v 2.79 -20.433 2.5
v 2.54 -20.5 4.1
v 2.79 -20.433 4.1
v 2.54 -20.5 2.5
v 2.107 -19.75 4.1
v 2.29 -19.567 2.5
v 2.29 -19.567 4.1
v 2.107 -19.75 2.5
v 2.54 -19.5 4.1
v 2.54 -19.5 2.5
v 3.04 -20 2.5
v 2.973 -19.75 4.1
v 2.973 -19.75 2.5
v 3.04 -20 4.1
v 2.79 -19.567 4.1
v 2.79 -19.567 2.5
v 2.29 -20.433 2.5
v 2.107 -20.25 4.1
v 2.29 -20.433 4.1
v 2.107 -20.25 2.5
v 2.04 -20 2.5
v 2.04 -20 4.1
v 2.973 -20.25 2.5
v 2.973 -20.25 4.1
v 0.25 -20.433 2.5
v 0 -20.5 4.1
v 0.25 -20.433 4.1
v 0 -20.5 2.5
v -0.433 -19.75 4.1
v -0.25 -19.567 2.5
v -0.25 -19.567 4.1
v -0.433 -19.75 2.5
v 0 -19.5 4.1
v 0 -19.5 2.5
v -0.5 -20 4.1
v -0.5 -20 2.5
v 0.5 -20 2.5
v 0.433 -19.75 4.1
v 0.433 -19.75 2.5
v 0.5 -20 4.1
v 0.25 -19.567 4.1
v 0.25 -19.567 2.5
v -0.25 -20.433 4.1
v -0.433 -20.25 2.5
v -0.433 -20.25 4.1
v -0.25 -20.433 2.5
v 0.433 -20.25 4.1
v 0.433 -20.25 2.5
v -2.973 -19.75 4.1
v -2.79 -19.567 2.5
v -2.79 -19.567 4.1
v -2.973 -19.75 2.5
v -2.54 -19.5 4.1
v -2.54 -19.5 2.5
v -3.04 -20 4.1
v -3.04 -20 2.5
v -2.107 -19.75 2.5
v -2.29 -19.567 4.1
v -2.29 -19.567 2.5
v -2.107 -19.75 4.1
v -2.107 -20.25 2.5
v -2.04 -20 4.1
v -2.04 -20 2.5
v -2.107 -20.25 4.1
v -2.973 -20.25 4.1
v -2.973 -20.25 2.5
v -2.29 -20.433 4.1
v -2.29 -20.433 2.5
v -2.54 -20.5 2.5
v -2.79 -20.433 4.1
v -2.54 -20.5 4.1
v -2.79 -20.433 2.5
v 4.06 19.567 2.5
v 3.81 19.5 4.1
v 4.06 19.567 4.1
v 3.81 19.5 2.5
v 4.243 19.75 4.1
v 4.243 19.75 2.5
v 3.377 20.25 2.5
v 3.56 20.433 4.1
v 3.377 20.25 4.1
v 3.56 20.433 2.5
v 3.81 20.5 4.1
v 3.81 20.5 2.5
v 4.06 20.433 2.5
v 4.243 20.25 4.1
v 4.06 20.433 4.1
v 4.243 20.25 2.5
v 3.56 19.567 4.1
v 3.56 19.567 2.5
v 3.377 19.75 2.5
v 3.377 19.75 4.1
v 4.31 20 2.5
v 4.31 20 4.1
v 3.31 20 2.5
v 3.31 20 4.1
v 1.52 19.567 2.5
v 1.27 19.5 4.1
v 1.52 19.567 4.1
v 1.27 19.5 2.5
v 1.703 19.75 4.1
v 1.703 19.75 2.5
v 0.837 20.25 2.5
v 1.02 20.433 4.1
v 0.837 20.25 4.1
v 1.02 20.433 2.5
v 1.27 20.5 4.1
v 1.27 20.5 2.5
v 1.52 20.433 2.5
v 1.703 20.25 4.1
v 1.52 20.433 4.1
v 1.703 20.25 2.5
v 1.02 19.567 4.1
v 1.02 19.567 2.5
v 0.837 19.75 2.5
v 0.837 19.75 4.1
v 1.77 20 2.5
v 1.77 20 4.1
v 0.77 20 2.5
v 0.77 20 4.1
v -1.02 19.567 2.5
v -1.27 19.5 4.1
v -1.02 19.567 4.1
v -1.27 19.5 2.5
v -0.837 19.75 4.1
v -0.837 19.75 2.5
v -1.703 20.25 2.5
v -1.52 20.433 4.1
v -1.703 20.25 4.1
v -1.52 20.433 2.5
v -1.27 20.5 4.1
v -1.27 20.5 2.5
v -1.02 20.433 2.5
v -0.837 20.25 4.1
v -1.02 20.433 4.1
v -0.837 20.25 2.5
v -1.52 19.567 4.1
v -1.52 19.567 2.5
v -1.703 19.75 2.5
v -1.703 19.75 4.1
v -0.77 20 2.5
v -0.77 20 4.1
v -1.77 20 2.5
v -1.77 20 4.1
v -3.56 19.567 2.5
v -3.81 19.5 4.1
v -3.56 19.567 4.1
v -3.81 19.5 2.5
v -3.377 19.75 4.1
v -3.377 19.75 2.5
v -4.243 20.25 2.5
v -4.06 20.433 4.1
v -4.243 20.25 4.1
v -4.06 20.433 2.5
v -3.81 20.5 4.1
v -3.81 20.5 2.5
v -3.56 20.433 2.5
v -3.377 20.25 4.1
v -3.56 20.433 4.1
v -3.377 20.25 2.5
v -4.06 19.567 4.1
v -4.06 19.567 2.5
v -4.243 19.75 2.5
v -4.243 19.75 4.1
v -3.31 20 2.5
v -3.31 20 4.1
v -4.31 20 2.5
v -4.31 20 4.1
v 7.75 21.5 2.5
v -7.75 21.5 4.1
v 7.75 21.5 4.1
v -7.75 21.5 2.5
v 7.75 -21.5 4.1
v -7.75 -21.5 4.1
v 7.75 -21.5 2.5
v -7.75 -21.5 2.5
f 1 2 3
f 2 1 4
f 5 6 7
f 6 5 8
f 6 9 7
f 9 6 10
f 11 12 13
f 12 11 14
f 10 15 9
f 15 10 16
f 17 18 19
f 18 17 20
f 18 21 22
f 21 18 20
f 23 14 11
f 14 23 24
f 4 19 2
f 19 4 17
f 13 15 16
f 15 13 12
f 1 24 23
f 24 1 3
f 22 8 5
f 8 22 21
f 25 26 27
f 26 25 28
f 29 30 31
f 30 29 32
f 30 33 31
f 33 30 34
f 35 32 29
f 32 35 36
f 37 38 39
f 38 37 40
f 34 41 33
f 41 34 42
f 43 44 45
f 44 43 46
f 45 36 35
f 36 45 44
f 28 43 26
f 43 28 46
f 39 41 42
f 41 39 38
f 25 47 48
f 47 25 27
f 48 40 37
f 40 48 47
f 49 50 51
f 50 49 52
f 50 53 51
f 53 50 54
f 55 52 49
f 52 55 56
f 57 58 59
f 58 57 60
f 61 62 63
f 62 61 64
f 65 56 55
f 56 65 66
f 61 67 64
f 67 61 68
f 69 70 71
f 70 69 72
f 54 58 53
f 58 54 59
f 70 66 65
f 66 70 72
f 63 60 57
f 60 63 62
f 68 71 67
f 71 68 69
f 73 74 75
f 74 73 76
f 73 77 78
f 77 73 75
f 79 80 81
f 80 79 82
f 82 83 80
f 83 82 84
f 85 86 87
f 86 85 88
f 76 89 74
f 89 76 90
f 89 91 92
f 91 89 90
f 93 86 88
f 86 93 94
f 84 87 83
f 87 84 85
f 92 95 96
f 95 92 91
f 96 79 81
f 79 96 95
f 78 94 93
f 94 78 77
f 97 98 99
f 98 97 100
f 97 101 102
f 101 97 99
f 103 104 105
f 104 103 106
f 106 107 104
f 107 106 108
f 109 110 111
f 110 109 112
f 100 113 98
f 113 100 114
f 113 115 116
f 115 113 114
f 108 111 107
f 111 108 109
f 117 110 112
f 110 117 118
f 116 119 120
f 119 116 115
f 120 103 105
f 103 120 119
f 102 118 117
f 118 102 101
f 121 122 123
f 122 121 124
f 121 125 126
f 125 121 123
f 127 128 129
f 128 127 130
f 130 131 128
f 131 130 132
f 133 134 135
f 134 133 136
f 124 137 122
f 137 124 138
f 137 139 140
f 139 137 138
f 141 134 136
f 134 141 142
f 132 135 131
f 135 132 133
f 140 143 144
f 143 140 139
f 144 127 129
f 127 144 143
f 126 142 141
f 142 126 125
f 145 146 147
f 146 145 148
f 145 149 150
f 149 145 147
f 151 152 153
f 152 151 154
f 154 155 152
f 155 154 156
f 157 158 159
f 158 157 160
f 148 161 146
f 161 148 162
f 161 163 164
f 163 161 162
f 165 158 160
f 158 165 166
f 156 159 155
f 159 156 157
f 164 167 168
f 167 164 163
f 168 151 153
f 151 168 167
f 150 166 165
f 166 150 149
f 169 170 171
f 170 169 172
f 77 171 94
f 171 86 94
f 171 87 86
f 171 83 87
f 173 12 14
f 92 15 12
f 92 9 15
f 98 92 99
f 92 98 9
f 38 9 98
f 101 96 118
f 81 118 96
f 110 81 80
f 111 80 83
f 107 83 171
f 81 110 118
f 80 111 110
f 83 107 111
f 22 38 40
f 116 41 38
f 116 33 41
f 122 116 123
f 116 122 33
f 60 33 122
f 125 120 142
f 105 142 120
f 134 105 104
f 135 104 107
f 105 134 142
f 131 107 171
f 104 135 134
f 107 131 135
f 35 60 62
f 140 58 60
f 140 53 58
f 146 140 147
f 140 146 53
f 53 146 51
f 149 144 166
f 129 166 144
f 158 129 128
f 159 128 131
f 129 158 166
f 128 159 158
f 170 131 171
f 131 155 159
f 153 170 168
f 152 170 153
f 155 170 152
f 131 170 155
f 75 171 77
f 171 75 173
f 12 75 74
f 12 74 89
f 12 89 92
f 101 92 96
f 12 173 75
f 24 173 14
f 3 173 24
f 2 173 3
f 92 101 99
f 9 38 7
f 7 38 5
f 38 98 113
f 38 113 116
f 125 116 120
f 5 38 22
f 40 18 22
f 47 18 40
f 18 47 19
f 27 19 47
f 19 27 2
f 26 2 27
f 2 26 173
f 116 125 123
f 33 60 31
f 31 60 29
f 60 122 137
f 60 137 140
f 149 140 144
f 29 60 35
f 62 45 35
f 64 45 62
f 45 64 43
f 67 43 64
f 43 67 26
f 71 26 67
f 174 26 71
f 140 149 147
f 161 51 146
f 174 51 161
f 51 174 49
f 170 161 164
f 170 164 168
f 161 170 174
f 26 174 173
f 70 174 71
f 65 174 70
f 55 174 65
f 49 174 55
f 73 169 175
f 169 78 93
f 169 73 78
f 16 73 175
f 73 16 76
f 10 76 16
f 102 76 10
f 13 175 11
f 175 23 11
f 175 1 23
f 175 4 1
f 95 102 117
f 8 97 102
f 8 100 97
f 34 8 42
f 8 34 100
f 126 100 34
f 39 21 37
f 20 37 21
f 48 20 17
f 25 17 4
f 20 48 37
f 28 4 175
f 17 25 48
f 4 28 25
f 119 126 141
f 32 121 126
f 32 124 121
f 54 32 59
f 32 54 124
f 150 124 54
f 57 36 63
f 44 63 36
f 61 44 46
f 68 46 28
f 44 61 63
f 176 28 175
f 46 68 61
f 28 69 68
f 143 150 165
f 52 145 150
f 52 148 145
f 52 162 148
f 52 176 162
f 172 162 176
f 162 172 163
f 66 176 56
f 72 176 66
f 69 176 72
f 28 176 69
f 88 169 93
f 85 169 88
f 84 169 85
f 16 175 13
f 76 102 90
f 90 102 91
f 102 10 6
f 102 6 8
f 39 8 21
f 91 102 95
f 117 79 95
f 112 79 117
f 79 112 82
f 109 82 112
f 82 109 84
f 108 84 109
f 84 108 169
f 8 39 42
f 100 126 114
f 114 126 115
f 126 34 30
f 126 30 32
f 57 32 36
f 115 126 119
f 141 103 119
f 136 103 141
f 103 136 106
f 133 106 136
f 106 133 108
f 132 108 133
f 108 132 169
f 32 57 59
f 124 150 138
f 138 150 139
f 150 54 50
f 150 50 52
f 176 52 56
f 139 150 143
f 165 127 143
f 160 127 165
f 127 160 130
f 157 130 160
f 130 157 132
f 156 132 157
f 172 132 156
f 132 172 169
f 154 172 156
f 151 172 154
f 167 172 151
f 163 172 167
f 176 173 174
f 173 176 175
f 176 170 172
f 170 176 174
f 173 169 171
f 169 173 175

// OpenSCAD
// file: ../../board-pocket/board-pocket.scad
//-----------------------------------------------------------------------
// Board pocket: holds a board that has no mounting holes
//
// The board sits on a central pedestal with a pad of double-sided foam tape
// on top, inside a low wall that follows its outline. The pedestal keeps
// the board's edges off the floor, so lead stubs soldered through the edge
// holes have room underneath; gaps in the wall let the leads out. The wall
// only locates the board: the tape holds it down, and in a closed box a lid
// pad presses a pad of foam onto it (boardLidPad below).
//
// Modules, all in the same frame:
//   boardPocketGhost()   the board and its tape, for previews
//   boardPocketHolder()  the plastic: pedestal and outline wall, add to the floor
//   boardLidPad()        a block hanging from the lid that presses foam onto the board
//   boardLidPadGhost()   the foam under it, squashed, for previews
//
// Frame: origin on the floor top, under the centre of the board's outline.
// X along the board's length l, Y across its width w, Z up. Units: mm.
//
// Sides are listed [-X, +X, -Y, +Y], each one of
//   "gap"    wall with a gap in the middle for leads (gapW wide)
//   "solid"  whole wall: use it where the board takes a push (a plug)
//   "open"   no wall: the board's edge goes into a box wall (a USB port)
//
// Used by esp32-c3-supermini, esp32-s3-devkitc and rs485-max485.
//-----------------------------------------------------------------------

//-- From the controller project's receiver.scad / rack-end.scad (boardPocket), 2026-10-30
bpPedestal  = 2.5;     // floor to the tape: room for lead stubs under the board edges
bpTape      = 1.0;     // double-sided foam tape on the pedestal. CAL: how far it squashes
bpWall      = 1.2;     // outline wall thickness
bpRise      = 1.0;     // wall top above the PCB underside (the controller project's rack-end: 0.8 under the S3's module)
bpClearance = 0.4;     // per side, board outline to wall: PETG. 0.3 for PLA. Set by the fit piece
bpGapW      = 6;       // lead gap in a "gap" side
bpPadInset  = 4;       // default pedestal: the board less this all round

//-- Lid hold-down (the controller project's receiver / rack-end lid pads)
bpFoam      = 3.0;     // CAL: self-adhesive foam stuck under each lid pad
bpSqueeze   = 1.0;     // how far the lid squashes it: ~1/3 for soft foam, 0.3 for felt

//-- PCB underside above the floor top
function boardPocketZ(pedestal = bpPedestal, tape = bpTape) = pedestal + tape;
//-- default pedestal [l, w] for a board
function boardPocketPad(l, w, inset = bpPadInset) = [max(l - 2*inset, 4), max(w - 2*inset, 4)];
//-- Z of a lid pad's underside, pressing on a surface at surfaceZ (board top, or a part on it)
function boardLidPadZ(surfaceZ, foam = bpFoam, squeeze = bpSqueeze) =
  assert(squeeze > 0 && squeeze < foam, "foam would not touch the board")
  surfaceZ + foam - squeeze;

function bpSides4(s) = is_list(s) ? s : [s, s, s, s];

module boardPocketGhost(l, w, pcb = 1.6, pad, pedestal = bpPedestal, tape = bpTape)
{
  p = is_undef(pad) ? boardPocketPad(l, w) : pad;
  %color("White") translate([-p[0]/2, -p[1]/2, pedestal]) cube([p[0], p[1], tape]);
  %color("DarkGreen") translate([-l/2, -w/2, pedestal + tape]) cube([l, w, pcb]);
}

//-- pad: pedestal [l, w]; gapW a number or one per side
module boardPocketHolder(l, w, pad, sides = "gap", gapW = bpGapW, clearance = bpClearance,
                         pedestal = bpPedestal, tape = bpTape, wall = bpWall, rise = bpRise)
{
  p   = is_undef(pad) ? boardPocketPad(l, w) : pad;
  s   = bpSides4(sides);
  g   = bpSides4(gapW);
  ix  = l/2 + clearance;                 // inner half sizes
  iy  = w/2 + clearance;
  top = pedestal + tape + rise;
  assert(p[0] <= l && p[1] <= w, "pedestal bigger than the board");
  for (k = s) assert(k == "gap" || k == "solid" || k == "open", str("unknown side ", k));

  //-- pedestal, centred under the board
  translate([-p[0]/2, -p[1]/2, -0.01]) cube([p[0], p[1], pedestal + 0.01]);
  //-- outline wall
  difference()
  {
    translate([-ix - wall, -iy - wall, -0.01]) cube([2*(ix + wall), 2*(iy + wall), top + 0.01]);
    translate([-ix, -iy, -1]) cube([2*ix, 2*iy, top + 2]);
    for (i = [0 : 3])
    {
      //-- each side's cut, drawn for -X then turned into place
      ax = (i < 2) ? ix : iy;         // inner half size across the side
      al = (i < 2) ? iy : ix;         // half length along it
      rotate([0, 0, [0, 180, 90, 270][i]])   // -X, +X, -Y, +Y
      {
        if (s[i] == "gap")
          translate([-ax - wall - 1, -g[i]/2, -1]) cube([wall + 2, g[i], top + 2]);
        if (s[i] == "open")
          translate([-ax - wall - 1, -al - wall - 1, -1]) cube([wall + 1.01, 2*(al + wall + 1), top + 2]);
      }
    }
  }
}

//-- A lid pad over the rectangle size [x, y] centred at `at`, from the squashed foam up to
//-- lidZ (the lid's inner face in this frame), running `into` up into the lid plate
module boardLidPad(size, at = [0, 0], surfaceZ, lidZ, foam = bpFoam, squeeze = bpSqueeze, into = 0.5)
{
  z0 = boardLidPadZ(surfaceZ, foam, squeeze);
  assert(lidZ > z0, "lid is below the pad: the box is too low for the foam");
  translate([at[0] - size[0]/2, at[1] - size[1]/2, z0]) cube([size[0], size[1], lidZ - z0 + into]);
}

module boardLidPadGhost(size, at = [0, 0], surfaceZ, foam = bpFoam, squeeze = bpSqueeze)
{
  %color("Gray") translate([at[0] - size[0]/2, at[1] - size[1]/2, surfaceZ]) cube([size[0], size[1], foam - squeeze]);
}
// file: ../../rs485-max485/rs485-max485.scad
//-----------------------------------------------------------------------
// TTL-to-RS485 module (MAX485 and friends), on the floor
//
// These modules have no mounting holes. The board sits on a taped pedestal
// inside an outline pocket (board-pocket), with lead gaps at both ends (bus
// end and logic end) and in the long sides. In a closed box two lid pads
// press foam onto it, one inboard of each end's pin row.
//
// Modules, all in the same frame:
//   rs485Ghost()     the board, its chips, pin holes and any screw terminal
//   rs485Holder()    the plastic: pedestal and outline pocket, add to the floor
//   rs485LidPads()   blocks under the lid that press foam onto the board
//
// Frame: origin on the floor top under the centre of the board. X along the
// board, bus end (A/B) at -X, logic end (VCC/TXD/RXD/GND) at +X. Z up. Units: mm.
//
// Sizes: pick a row of rs485Variants by name.
//-----------------------------------------------------------------------

//-- included, not used, so its default values (bpTape, bpClearance...) are in scope here
include <../board-pocket/board-pocket.scad>

//-- [name, length, width, pcb, tallest SMD, bus pins, logic pins, screw terminal [l, w, h] or undef]
rs485Variants = [
  //-- JZK 5-pack B09VGJCJKQ, auto-direction (MAX485 + CD4069). Outline measured 2026-10-21;
  //-- PCB CAL (probably 1.6). Bus end: A+ B- earth, bare holes. Logic: VCC TXD RXD GND
  ["jzk",    43.0, 15.5,  1.6, 2.0, 3, 4, undef],
  //-- XY-017 auto-direction (WINGONEER manual, manuals.plus/asin/B06XHH6B6R): 42.8 x 15.22 x 0.8.
  //-- Looks like the same family as the JZK; pin counts CAL
  ["xy-017", 42.8, 15.22, 0.8, 2.0, 3, 4, undef],
  //-- Classic blue MAX485 module (HW-0519 style): 44 x 14 on most listings (some 45 x 15, 46 x 12),
  //-- 4-pin header each end (RO RE DE DI / VCC B A GND), 2-way 5.08 screw terminal at the bus end.
  //-- PCB, terminal size and its place on the board CAL
  ["max485", 44.0, 14.0,  1.6, 2.0, 4, 4, [7.5, 10.2, 10.0]],
];
rs485Variant  = "jzk";

rs485PinPitch = 2.54;
rs485PinEnd   = 1.5;      // CAL: pin row centre from the board's end
rs485ChipSize = [5.0, 6.0, 1.75];   // SOIC-8, ghost only; placed either side of the middle (CAL)
//-- Holder (the controller project's receiver.scad / rack-end.scad)
rs485PadEnd   = 8.5;      // pedestal stops this far from each end: clear of the pin stubs
rs485PadSide  = 3.25;     // and this far from each long side (26 x 9 on the JZK)
rs485EndGap   = 10;       // lead gap at the ends: the 4-pin row is 7.62 across, plus wire
rs485SideGap  = 6;
rs485PadInset = 6;        // lid pads: this far inboard of each end
rs485PadLen   = 6;

function rs485(name = rs485Variant) = let (i = search([name], rs485Variants)[0])
  assert(i != [] && i != undef, str("unknown RS485 variant ", name)) rs485Variants[i];
function rs485Pad(variant = rs485Variant) = let (v = rs485(variant))
  [v[1] - 2*rs485PadEnd, v[2] - 2*rs485PadSide];
//-- PCB top above the floor
function rs485Top(variant = rs485Variant, pedestal = bpPedestal, tape = bpTape) =
  boardPocketZ(pedestal, tape) + rs485(variant)[3];

module rs485Ghost(variant = rs485Variant, pedestal = bpPedestal, tape = bpTape)
{
  v   = rs485(variant);
  top = rs485Top(variant, pedestal, tape);
  boardPocketGhost(v[1], v[2], v[3], rs485Pad(variant), pedestal, tape);
  for (x = [-1, 1])
    %color("Black") translate([x*5 - rs485ChipSize[0]/2, -rs485ChipSize[1]/2, top]) cube(rs485ChipSize);
  //-- pin rows across each end
  for (e = [[-1, v[5]], [1, v[6]]], i = [0 : e[1] - 1])
    %color("Gold") translate([e[0]*(v[1]/2 - rs485PinEnd), (i - (e[1] - 1)/2)*rs485PinPitch, top - v[3] - 0.01])
      cylinder(d = 1.0, h = v[3] + 0.02, $fn = 12);
  if (!is_undef(v[7]))
    %color("RoyalBlue") translate([-v[1]/2 + 3, -v[7][1]/2, top]) cube(v[7]);
}

module rs485Holder(variant = rs485Variant, sides = "gap", clearance = bpClearance,
                   pedestal = bpPedestal, tape = bpTape, rise = bpRise)
{
  v = rs485(variant);
  boardPocketHolder(v[1], v[2], rs485Pad(variant), sides,
                    [rs485EndGap, rs485EndGap, rs485SideGap, rs485SideGap],
                    clearance, pedestal, tape, bpWall, rise);
}

//-- lidZ: the lid's inner face above the floor top. With a screw terminal, the bus-end pad
//-- moves inboard of it
module rs485LidPads(lidZ, variant = rs485Variant, foam = bpFoam, squeeze = bpSqueeze,
                    pedestal = bpPedestal, tape = bpTape)
{
  v   = rs485(variant);
  top = rs485Top(variant, pedestal, tape);
  busIn = is_undef(v[7]) ? rs485PadInset : 3 + v[7][0] + 1;
  for (x = [-v[1]/2 + busIn + rs485PadLen/2, v[1]/2 - rs485PadInset - rs485PadLen/2])
    boardLidPad([rs485PadLen, v[2] - 3], [x, 0], top, lidZ, foam, squeeze);
}
// main file
// The JZK RS485 module as solids, for the catalogue (the Ghost is % so it never renders),
// seated on a 2.5 pedestal with its length along Y. part = "board" | "chips";
// n boards at the fit piece's pitch along X.
include <../../rs485-max485/rs485-max485.scad>

variant  = "jzk";
part     = "board";
n        = 1;
pitch    = 31;
pedestal = 2.5;

v   = rs485(variant);
top = pedestal + v[3];

module one()
{
  rotate([0, 0, 90])
  {
    if (part == "board") difference()
    {
      translate([-v[1]/2, -v[2]/2, pedestal]) cube([v[1], v[2], v[3]]);
      for (e = [[-1, v[5]], [1, v[6]]], i = [0 : e[1] - 1])
        translate([e[0]*(v[1]/2 - rs485PinEnd), (i - (e[1] - 1)/2)*rs485PinPitch, pedestal - 1])
          cylinder(d = 1.0, h = v[3] + 2, $fn = 12);
    }
    if (part == "chips")
      for (x = [-1, 1]) translate([x*5 - rs485ChipSize[0]/2, -rs485ChipSize[1]/2, top - 0.01]) cube(rs485ChipSize + [0, 0, 0.01]);
  }
}

for (i = [0 : n - 1]) translate([i*pitch, 0, 0]) one();
